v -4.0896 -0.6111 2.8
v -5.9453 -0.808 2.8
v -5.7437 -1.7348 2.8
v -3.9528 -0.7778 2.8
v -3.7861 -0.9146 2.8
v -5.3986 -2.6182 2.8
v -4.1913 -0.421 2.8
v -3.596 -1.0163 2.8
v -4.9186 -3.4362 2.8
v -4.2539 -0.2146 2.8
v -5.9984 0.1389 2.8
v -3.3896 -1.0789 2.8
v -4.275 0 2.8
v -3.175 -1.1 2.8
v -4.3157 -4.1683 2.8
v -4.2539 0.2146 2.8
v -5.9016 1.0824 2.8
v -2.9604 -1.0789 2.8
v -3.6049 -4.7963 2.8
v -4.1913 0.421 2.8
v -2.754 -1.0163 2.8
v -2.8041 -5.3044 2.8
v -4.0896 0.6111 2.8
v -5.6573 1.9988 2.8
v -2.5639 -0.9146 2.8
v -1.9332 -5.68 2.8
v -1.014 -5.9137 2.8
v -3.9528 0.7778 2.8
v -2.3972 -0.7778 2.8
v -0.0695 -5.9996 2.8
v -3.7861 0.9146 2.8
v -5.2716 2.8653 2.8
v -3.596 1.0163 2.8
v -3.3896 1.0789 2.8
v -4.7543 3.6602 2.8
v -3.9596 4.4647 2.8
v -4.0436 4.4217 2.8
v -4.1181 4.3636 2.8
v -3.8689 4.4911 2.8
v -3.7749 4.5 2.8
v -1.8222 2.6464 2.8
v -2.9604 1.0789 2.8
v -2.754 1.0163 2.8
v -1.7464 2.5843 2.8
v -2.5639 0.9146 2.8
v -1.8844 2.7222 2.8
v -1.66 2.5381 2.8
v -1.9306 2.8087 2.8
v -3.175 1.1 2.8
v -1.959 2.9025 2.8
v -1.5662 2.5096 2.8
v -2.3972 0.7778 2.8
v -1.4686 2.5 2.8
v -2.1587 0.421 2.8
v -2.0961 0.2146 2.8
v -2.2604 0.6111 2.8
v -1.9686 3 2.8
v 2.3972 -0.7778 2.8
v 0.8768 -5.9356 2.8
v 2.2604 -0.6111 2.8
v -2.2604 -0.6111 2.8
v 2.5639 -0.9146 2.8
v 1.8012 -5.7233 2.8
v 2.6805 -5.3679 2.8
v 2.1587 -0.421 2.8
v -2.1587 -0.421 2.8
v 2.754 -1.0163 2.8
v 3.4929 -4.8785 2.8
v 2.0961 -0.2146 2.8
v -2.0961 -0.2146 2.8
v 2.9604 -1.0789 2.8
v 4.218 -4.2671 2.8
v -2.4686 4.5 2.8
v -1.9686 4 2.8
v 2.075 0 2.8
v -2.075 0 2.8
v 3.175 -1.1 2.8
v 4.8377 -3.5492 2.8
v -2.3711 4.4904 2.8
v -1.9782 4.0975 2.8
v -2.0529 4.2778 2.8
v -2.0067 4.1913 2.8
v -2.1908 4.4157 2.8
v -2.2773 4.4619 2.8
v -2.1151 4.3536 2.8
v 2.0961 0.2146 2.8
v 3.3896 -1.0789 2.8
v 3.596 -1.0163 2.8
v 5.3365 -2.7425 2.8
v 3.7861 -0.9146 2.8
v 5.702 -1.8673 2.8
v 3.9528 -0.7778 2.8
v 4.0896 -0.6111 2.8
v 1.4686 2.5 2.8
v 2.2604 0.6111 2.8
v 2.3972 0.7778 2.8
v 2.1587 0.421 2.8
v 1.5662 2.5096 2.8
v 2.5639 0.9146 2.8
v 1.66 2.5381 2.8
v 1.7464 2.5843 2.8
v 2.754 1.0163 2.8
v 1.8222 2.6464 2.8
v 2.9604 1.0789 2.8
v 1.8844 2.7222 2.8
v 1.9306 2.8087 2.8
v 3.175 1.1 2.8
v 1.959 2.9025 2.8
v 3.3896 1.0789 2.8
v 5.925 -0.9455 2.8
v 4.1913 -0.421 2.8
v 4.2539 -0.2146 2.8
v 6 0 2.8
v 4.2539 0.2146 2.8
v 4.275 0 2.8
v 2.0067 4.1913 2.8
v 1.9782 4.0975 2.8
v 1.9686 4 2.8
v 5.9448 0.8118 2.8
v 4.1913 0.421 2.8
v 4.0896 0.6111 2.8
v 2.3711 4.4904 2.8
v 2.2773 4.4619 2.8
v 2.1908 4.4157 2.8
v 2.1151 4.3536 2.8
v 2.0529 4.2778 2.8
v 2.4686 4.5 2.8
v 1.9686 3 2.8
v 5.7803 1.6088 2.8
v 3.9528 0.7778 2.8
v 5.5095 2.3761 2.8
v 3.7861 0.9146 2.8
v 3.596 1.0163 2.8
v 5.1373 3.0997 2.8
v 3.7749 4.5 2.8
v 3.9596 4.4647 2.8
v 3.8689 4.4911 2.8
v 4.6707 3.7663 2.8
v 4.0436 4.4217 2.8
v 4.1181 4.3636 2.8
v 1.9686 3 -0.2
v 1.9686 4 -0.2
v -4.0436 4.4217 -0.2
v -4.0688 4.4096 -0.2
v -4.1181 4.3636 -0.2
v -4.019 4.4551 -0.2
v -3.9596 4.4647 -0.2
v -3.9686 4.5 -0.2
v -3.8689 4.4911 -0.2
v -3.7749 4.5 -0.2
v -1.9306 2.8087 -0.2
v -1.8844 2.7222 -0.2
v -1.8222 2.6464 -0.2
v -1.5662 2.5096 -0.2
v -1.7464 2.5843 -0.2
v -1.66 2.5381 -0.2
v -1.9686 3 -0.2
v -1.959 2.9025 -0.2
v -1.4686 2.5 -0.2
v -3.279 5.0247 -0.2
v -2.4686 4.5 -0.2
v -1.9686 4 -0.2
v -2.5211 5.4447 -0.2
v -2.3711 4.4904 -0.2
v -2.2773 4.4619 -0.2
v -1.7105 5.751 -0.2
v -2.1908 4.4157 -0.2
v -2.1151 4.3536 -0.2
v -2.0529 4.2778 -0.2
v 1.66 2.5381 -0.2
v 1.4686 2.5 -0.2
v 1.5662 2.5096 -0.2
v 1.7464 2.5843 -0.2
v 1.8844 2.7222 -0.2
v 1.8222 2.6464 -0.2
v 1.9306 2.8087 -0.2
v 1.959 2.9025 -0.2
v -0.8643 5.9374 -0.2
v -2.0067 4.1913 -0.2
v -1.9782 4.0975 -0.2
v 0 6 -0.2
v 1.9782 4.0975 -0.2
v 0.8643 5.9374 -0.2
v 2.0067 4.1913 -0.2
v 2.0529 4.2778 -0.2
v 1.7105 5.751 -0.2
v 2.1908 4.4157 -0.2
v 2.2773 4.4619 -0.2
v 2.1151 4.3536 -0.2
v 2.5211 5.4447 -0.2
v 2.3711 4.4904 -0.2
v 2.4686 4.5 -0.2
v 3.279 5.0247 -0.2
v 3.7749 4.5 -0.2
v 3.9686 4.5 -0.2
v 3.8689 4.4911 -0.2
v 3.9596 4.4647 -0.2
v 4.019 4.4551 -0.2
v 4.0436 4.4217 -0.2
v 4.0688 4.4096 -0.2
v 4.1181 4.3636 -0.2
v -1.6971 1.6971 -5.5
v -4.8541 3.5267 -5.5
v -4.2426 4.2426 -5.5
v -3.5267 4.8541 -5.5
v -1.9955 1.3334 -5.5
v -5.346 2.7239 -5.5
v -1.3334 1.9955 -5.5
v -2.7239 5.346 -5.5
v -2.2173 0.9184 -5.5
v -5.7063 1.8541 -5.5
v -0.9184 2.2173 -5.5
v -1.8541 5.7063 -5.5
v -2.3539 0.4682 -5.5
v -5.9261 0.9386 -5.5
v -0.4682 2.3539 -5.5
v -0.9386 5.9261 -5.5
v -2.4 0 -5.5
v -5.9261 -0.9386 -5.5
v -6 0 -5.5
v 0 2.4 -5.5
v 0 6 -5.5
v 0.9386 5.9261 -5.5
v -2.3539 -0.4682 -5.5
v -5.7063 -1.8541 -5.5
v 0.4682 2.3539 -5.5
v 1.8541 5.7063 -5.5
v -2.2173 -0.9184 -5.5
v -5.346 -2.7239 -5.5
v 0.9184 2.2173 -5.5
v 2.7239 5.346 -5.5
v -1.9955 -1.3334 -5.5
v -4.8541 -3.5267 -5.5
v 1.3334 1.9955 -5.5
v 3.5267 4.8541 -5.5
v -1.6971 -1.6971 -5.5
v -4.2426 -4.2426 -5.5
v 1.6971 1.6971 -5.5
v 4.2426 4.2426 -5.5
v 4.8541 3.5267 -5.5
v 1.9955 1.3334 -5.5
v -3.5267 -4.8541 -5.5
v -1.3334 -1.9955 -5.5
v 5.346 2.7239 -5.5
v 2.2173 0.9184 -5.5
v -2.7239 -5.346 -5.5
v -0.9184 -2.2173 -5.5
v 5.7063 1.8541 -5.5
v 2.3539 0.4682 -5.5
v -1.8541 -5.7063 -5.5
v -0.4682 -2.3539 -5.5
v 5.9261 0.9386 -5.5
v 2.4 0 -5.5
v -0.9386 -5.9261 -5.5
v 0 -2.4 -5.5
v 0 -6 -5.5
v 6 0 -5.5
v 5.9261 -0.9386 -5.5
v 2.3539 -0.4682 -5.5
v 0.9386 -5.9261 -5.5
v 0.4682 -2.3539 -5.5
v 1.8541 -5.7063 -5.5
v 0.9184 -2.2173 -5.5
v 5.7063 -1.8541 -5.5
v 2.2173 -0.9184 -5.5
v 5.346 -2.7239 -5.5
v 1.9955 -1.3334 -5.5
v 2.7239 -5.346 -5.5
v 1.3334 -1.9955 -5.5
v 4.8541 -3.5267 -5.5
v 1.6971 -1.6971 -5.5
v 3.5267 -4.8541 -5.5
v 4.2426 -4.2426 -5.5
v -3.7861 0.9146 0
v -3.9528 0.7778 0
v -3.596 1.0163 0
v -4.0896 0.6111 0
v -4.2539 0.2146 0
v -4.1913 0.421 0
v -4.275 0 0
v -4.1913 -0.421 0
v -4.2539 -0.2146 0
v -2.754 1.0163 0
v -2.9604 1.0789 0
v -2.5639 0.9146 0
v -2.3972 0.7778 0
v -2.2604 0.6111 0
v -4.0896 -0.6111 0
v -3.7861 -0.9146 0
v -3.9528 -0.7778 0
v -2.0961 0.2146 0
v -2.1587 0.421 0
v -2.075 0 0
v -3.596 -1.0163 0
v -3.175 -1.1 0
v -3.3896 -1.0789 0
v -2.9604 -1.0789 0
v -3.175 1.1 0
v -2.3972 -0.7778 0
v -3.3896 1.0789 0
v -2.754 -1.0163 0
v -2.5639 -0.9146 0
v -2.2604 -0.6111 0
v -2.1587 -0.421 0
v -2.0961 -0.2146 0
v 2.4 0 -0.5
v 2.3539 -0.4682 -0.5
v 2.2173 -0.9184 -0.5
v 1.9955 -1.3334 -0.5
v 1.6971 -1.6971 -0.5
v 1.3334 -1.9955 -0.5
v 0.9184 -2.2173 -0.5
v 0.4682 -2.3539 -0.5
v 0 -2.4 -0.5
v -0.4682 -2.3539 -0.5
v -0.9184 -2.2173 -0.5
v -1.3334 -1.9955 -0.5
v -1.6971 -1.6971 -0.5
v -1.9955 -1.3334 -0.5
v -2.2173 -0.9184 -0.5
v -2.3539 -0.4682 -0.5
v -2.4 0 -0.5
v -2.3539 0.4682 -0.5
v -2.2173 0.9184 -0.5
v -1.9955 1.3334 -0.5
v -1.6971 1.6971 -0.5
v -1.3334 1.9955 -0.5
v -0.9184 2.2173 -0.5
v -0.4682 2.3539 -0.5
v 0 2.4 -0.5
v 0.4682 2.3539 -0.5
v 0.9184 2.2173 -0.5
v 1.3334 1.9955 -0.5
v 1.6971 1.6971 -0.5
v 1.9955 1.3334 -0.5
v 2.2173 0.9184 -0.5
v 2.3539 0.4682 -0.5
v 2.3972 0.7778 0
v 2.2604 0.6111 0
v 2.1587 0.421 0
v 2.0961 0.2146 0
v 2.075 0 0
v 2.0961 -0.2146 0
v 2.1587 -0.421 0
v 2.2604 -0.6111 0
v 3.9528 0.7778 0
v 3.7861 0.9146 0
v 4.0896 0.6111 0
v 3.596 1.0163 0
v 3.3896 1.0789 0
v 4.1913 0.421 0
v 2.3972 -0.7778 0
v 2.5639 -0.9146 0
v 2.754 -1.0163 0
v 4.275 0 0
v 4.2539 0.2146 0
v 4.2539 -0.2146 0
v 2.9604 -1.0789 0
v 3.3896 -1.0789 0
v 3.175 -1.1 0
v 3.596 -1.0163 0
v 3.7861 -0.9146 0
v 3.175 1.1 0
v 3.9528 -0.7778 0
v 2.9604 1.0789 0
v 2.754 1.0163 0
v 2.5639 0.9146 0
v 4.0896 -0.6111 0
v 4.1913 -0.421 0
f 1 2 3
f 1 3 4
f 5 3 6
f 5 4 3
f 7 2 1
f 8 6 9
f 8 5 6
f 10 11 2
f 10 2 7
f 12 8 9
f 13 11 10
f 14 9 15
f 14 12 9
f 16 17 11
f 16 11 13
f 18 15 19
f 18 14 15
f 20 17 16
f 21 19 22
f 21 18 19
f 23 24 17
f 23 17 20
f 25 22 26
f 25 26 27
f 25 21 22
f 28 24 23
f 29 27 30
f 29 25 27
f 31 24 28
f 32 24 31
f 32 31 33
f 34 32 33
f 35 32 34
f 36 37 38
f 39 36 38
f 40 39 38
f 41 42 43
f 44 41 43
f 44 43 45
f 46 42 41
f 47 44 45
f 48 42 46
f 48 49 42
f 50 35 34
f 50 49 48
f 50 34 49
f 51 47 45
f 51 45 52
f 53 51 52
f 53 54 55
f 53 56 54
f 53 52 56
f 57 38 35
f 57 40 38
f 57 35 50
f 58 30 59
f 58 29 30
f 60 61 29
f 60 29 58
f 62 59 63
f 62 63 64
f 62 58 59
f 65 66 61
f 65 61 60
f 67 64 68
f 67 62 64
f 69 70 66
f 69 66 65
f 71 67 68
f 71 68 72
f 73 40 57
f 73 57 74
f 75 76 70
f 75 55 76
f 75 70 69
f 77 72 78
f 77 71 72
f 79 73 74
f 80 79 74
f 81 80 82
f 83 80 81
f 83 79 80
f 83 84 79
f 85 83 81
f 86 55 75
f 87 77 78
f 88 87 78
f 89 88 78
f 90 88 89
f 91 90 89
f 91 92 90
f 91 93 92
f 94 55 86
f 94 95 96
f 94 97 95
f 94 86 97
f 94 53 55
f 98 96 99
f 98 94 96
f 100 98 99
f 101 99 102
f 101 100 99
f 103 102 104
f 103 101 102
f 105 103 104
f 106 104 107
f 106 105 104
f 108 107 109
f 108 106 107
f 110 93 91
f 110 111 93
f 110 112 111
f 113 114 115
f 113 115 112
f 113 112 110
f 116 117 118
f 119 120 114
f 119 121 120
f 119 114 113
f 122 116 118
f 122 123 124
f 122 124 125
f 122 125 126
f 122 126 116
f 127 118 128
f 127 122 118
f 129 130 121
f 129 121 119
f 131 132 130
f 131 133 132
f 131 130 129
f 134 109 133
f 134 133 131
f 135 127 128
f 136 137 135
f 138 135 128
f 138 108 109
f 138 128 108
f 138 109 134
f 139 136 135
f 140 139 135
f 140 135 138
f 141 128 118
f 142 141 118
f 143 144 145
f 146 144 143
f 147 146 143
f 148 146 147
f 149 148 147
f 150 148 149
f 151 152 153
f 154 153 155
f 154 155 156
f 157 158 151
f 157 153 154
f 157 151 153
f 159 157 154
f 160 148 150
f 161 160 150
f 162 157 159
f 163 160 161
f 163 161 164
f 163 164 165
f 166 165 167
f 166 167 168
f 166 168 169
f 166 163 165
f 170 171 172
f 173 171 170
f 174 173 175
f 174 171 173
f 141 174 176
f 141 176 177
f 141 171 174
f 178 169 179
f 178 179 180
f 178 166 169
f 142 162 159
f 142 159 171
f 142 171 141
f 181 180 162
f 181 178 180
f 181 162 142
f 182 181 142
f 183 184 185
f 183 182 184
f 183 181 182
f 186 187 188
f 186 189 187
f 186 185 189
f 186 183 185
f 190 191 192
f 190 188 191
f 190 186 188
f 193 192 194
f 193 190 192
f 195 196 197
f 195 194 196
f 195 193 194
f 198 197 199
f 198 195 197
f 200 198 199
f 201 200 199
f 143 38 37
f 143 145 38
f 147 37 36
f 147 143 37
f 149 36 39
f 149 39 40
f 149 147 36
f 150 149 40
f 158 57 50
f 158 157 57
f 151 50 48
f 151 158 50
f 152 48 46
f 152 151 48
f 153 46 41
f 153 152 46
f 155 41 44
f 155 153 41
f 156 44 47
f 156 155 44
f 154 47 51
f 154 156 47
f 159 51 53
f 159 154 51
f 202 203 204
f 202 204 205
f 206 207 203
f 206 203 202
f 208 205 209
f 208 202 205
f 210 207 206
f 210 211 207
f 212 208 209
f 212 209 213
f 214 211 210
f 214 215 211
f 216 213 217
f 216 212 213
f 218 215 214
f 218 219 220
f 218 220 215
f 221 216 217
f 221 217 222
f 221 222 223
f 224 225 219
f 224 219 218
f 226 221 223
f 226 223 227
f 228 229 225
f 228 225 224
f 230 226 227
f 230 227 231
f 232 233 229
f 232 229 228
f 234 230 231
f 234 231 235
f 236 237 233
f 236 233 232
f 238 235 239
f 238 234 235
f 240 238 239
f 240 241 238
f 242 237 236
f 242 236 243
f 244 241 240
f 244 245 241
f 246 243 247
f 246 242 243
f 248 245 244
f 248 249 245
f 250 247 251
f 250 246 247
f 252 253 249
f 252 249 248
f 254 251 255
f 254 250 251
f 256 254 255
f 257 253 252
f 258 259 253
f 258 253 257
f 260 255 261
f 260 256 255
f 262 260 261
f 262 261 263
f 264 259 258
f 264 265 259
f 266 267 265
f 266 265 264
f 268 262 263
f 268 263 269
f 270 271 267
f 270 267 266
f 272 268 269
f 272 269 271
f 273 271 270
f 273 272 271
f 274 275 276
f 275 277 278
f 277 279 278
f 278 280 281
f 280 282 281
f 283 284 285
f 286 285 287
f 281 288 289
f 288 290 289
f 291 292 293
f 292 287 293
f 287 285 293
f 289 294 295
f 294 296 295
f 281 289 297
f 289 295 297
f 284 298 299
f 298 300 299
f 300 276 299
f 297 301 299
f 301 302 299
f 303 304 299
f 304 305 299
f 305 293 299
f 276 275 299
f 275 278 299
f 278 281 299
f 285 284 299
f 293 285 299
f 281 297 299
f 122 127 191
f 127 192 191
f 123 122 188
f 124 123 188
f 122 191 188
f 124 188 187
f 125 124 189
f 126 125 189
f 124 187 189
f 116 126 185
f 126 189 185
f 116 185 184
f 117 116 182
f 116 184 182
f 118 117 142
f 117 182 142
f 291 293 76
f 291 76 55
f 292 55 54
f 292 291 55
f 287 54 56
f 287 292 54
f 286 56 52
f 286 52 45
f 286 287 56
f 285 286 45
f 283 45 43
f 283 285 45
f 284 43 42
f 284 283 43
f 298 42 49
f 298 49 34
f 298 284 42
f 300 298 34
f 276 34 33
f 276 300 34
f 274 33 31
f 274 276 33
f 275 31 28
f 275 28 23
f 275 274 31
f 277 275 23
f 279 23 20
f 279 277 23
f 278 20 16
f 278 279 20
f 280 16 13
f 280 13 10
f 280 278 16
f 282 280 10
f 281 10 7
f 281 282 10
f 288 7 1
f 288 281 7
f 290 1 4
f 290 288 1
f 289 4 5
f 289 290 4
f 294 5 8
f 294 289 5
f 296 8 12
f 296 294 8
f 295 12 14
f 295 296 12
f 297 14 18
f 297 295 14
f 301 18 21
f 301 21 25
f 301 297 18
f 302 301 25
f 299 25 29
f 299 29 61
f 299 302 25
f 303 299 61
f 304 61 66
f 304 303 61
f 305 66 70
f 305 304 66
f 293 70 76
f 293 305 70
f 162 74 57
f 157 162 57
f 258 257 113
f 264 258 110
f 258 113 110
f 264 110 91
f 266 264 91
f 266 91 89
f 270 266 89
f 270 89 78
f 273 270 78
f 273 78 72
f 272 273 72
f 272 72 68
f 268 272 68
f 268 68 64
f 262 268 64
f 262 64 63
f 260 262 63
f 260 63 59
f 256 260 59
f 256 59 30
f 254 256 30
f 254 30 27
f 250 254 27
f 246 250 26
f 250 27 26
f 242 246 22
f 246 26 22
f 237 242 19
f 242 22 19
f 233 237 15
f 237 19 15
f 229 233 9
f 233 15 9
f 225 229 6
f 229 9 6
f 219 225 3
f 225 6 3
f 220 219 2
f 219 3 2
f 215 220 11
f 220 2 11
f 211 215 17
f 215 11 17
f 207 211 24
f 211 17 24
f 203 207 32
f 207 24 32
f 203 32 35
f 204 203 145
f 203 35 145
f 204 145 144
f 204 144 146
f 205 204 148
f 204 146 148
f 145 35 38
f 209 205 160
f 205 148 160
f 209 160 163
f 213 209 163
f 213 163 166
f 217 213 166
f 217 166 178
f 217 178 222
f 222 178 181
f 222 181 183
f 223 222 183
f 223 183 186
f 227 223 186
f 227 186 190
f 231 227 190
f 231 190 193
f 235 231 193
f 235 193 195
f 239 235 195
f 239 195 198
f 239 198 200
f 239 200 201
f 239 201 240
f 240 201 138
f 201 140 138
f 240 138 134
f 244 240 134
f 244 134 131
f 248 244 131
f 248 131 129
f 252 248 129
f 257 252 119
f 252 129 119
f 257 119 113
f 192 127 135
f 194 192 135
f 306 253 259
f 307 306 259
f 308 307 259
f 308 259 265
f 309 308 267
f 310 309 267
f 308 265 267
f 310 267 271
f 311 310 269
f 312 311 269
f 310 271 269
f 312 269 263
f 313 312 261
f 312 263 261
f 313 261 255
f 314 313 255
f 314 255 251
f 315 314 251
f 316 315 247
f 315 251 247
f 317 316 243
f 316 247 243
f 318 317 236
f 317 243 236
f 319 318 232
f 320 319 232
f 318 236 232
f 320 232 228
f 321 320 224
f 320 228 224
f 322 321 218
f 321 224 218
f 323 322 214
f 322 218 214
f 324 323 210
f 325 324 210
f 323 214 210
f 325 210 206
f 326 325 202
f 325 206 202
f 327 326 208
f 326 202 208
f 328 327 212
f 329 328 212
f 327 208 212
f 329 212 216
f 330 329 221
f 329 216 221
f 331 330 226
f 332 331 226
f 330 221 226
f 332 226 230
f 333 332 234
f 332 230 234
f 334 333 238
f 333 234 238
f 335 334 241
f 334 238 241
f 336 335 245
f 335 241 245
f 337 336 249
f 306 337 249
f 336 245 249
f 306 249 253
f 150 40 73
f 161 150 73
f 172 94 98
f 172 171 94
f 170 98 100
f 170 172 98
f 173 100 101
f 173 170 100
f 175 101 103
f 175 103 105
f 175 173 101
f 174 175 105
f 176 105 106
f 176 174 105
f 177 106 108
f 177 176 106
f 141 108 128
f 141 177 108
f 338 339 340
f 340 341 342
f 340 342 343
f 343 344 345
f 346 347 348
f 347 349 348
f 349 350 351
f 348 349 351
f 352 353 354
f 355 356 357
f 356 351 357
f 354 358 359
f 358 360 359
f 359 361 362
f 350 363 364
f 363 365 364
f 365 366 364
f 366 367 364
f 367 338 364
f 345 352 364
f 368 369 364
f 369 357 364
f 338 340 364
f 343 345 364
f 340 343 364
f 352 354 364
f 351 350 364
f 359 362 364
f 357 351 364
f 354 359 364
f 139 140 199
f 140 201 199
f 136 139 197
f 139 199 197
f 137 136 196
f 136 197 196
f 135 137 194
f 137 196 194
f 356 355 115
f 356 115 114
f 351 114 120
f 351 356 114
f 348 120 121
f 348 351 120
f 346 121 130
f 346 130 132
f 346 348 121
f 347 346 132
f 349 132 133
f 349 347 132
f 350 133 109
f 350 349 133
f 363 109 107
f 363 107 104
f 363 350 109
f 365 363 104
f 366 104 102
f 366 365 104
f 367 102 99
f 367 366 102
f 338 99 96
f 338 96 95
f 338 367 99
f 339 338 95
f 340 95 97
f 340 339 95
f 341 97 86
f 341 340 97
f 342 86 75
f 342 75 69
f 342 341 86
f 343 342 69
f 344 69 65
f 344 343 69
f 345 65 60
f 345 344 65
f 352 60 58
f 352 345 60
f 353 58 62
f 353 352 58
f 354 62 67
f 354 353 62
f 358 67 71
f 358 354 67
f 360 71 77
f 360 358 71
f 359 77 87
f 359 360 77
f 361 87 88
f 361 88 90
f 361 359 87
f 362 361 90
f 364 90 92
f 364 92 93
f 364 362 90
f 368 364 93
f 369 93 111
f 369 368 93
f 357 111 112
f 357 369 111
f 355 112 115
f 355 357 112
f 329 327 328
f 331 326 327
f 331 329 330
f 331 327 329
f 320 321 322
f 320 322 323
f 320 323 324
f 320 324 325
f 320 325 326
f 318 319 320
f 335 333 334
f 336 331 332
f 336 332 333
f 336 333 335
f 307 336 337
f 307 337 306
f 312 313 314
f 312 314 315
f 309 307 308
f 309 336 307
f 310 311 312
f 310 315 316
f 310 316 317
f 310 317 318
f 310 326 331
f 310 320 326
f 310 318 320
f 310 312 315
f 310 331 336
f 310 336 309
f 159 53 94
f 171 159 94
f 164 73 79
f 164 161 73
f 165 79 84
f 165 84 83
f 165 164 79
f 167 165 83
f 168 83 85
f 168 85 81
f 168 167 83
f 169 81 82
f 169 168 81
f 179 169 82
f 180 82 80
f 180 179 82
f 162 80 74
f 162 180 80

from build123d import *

# Parameters (mm, degrees)
F0_R     = 6
F0_R_2   = 1.1
F1_DEPTH = 2.8
F2_R     = 6
F3_DEPTH = 5.5
F5_DEPTH = 3
F6_R     = 0.5
F7_R     = 2.4
F8_DEPTH = 5


with BuildPart() as f1:
    # F0 (on Top) → F1 (new body)
    with BuildSketch(Plane.XY):
        Circle(F0_R)
        with Locations((-3.175, 0)):
            Circle(F0_R_2, mode=Mode.SUBTRACT)
        with Locations((3.175, 0)):
            Circle(F0_R_2, mode=Mode.SUBTRACT)
    extrude(amount=F1_DEPTH)

    # F2 (on face) → F3 (join)
    with BuildSketch(Plane(origin=(0, 0, 0), x_dir=(1, 0, 0), z_dir=(0, 0, -1))):
        Circle(F2_R)
    extrude(amount=F3_DEPTH)

    # F4 (on face) → F5 (cut)
    with BuildSketch(Plane.XY.offset(2.8)):
        with BuildLine():
            ThreePointArc((3.968627, 4.5), (0, 6), (-3.968627, 4.5))
            Line((-3.968627, 4.5), (-1.968627, 4.5))
            Line((-1.968627, 4.5), (-1.968627, 2.5))
            Line((-1.968627, 2.5), (1.968627, 2.5))
            Line((1.968627, 2.5), (1.968627, 4.5))
            Line((1.968627, 4.5), (3.968627, 4.5))
        make_face()
    extrude(amount=-F5_DEPTH, mode=Mode.SUBTRACT)

    # F6
    f6_edges = [f1.edges().sort_by_distance(p)[0] for p in [
        (-3.968627, 4.5, 1.3),
        (-1.968627, 4.5, 1.3),
        (1.968627, 2.5, 1.3),
        (1.968627, 4.5, 1.3),
        (3.968627, 4.5, 1.3),
        (-1.968627, 2.5, 1.3),
    ]]
    fillet(f6_edges, radius=F6_R)

    # F7 (on face) → F8 (cut)
    with BuildSketch(Plane(origin=(0, 0, -5.5), x_dir=(1, 0, 0), z_dir=(0, 0, -1))):
        Circle(F7_R)
    extrude(amount=-F8_DEPTH, mode=Mode.SUBTRACT)


solid = f1.part
